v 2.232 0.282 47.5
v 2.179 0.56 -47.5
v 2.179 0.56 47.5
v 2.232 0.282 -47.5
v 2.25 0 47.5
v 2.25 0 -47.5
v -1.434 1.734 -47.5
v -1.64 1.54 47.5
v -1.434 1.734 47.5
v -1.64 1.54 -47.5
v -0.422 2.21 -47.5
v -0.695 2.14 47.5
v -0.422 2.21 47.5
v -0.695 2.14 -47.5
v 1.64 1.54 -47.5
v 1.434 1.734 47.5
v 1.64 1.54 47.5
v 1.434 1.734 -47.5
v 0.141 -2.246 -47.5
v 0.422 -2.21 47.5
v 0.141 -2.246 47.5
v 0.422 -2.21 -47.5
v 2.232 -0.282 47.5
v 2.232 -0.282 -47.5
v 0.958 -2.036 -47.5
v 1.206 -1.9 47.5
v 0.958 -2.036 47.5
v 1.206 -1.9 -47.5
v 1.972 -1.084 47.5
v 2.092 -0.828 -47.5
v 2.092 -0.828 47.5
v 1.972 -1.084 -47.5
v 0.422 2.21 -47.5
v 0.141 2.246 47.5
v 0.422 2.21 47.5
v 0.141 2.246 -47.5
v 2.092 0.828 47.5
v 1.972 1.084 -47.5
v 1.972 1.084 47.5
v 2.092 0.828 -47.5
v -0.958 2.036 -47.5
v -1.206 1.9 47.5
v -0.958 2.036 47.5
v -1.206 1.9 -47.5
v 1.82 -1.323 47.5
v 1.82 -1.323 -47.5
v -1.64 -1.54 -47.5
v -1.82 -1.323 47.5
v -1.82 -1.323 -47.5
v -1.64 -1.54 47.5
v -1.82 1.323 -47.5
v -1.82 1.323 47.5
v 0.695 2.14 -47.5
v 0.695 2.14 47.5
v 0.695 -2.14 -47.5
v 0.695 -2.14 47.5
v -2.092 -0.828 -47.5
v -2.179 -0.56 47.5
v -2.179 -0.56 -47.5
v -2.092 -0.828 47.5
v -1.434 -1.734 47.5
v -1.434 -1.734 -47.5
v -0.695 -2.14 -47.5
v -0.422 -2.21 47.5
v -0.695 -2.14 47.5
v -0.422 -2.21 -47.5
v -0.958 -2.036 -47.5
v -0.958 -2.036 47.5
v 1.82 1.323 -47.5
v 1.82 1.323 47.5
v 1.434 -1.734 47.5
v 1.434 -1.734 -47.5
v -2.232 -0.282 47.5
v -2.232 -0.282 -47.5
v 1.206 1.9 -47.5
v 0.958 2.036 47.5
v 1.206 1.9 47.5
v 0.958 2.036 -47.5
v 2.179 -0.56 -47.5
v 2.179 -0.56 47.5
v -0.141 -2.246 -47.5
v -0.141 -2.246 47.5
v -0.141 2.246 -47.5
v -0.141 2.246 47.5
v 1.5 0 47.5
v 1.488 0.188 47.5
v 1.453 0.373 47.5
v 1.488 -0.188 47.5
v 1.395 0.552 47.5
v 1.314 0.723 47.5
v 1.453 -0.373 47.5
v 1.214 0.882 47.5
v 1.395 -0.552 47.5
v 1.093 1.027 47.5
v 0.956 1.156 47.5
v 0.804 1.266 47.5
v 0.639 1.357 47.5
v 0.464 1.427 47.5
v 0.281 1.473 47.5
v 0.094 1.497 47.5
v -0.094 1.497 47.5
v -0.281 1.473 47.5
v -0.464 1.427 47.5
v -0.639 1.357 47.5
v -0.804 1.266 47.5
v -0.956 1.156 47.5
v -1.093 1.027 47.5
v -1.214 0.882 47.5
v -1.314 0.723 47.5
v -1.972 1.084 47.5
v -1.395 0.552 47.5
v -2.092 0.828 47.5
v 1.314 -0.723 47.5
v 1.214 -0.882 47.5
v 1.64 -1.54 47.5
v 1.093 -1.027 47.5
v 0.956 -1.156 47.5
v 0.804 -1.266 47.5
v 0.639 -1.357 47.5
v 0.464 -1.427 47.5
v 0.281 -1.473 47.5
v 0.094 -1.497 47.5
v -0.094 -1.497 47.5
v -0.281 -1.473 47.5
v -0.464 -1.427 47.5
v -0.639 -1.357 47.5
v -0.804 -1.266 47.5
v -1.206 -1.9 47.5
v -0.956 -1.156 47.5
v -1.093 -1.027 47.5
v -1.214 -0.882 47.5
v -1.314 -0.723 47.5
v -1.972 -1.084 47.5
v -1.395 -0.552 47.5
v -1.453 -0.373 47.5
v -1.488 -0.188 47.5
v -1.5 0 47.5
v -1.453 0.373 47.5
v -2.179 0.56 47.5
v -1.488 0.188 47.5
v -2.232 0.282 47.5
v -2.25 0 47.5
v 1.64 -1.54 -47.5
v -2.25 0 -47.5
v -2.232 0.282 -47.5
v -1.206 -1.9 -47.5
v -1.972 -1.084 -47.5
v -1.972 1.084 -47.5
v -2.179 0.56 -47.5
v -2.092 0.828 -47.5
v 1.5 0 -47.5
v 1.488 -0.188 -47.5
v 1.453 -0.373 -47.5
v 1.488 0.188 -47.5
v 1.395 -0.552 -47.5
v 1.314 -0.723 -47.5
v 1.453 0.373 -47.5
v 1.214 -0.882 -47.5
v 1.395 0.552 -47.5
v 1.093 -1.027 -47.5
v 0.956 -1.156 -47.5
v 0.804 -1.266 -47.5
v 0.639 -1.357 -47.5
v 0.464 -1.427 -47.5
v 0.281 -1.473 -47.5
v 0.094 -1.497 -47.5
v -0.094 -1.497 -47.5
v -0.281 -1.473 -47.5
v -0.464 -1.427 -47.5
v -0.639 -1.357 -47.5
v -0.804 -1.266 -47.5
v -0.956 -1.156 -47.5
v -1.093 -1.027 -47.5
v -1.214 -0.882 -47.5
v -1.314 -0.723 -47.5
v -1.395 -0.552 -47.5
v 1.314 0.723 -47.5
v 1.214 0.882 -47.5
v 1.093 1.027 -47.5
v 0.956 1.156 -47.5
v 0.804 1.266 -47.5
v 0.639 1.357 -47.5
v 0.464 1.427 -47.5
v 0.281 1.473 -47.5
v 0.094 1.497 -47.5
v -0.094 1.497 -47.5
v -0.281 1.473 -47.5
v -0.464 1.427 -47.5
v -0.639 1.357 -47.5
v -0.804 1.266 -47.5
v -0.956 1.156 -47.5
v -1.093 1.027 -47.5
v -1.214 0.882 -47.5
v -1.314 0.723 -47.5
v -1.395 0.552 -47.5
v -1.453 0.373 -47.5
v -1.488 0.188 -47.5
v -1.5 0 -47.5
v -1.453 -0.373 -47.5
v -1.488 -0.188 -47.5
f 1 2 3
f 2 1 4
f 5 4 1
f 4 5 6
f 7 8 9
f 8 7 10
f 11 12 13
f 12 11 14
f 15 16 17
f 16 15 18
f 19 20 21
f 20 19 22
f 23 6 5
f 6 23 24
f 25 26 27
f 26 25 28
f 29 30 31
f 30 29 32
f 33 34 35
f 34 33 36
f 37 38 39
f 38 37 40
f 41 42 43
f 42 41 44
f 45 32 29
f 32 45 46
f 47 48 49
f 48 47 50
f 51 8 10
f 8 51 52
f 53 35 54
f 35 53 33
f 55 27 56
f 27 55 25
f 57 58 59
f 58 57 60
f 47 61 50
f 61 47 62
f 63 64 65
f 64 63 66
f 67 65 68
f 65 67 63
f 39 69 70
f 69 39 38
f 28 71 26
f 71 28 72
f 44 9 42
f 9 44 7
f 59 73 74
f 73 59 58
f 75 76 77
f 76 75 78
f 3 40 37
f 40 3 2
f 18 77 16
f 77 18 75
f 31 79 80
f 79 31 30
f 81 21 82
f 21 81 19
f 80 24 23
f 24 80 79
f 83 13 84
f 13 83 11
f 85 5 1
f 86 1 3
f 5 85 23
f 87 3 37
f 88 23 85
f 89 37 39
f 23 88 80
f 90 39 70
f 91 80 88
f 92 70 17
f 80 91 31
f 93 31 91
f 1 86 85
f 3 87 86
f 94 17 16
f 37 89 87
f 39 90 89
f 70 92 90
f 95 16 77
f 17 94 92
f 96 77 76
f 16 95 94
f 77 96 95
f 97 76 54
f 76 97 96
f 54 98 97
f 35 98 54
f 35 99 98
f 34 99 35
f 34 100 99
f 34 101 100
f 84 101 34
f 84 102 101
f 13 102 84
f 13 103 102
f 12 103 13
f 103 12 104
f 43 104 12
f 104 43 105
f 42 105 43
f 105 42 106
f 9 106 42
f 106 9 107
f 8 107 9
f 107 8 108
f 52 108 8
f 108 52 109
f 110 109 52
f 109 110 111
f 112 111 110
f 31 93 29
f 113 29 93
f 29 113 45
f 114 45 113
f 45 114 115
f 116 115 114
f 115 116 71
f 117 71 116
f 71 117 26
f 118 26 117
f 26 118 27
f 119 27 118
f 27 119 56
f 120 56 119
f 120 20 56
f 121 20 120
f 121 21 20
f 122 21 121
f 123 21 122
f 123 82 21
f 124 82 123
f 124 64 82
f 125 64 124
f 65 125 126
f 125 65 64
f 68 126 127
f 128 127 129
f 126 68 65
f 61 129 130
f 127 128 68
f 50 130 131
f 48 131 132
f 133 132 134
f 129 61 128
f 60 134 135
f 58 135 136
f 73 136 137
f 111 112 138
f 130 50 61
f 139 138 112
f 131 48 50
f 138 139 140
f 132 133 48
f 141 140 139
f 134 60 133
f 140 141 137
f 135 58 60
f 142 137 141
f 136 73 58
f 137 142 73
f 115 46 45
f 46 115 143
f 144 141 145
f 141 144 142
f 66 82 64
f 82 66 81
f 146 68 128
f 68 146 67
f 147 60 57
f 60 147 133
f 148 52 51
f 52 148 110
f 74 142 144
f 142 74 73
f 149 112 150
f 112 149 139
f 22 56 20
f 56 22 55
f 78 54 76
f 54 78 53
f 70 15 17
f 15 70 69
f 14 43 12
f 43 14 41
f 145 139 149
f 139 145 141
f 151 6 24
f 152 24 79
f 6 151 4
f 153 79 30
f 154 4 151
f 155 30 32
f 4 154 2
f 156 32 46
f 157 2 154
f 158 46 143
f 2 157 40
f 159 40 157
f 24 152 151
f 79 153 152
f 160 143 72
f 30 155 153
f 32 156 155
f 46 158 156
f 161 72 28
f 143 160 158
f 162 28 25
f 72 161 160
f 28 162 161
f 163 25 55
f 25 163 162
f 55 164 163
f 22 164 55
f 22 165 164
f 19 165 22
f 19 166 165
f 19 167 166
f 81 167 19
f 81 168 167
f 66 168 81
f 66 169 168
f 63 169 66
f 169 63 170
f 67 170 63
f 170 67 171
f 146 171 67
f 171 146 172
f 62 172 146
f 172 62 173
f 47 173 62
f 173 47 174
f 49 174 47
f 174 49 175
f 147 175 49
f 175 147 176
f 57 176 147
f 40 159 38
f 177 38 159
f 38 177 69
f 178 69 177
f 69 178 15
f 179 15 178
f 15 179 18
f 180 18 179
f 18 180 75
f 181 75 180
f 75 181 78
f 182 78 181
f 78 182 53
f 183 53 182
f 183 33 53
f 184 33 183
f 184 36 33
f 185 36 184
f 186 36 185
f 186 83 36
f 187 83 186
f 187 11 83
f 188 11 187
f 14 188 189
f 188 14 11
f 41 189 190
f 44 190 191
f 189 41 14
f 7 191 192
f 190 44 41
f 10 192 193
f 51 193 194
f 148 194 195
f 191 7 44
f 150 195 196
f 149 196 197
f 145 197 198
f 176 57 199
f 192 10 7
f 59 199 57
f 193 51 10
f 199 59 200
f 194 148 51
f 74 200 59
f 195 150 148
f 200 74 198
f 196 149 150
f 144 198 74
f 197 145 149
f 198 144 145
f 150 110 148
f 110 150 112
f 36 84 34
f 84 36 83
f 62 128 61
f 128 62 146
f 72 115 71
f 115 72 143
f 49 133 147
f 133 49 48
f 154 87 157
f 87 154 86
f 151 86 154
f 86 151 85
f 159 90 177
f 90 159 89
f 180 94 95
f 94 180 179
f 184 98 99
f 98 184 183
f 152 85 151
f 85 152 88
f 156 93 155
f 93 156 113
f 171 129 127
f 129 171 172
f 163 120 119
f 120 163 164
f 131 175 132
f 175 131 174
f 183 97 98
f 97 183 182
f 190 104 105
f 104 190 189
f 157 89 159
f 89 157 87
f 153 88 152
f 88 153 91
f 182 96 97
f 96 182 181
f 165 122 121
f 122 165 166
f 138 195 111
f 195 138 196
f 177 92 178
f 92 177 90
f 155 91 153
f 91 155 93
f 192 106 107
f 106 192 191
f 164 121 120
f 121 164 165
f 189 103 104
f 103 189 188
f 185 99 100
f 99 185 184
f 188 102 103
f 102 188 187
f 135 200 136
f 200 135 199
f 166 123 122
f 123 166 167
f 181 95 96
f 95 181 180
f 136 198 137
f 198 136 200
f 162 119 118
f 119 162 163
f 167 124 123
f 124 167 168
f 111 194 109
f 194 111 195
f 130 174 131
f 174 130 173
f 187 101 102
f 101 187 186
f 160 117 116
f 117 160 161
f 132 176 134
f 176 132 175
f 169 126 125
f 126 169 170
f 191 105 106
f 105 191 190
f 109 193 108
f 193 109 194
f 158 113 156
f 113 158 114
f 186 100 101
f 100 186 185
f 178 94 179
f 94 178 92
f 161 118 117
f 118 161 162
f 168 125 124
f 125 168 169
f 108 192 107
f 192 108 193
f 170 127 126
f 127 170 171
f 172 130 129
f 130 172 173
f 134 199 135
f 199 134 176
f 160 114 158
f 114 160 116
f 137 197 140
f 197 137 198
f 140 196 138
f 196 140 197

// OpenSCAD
$fn = 50;


difference() {
	union() {
		translate(v = [0, 0, -47.5000000000]) {
			cylinder(h = 95, r = 2.2500000000);
		}
	}
	union() {
		translate(v = [0, 0, -100.0000000000]) {
			cylinder(h = 200, r = 1.5000000000);
		}
	}
}
